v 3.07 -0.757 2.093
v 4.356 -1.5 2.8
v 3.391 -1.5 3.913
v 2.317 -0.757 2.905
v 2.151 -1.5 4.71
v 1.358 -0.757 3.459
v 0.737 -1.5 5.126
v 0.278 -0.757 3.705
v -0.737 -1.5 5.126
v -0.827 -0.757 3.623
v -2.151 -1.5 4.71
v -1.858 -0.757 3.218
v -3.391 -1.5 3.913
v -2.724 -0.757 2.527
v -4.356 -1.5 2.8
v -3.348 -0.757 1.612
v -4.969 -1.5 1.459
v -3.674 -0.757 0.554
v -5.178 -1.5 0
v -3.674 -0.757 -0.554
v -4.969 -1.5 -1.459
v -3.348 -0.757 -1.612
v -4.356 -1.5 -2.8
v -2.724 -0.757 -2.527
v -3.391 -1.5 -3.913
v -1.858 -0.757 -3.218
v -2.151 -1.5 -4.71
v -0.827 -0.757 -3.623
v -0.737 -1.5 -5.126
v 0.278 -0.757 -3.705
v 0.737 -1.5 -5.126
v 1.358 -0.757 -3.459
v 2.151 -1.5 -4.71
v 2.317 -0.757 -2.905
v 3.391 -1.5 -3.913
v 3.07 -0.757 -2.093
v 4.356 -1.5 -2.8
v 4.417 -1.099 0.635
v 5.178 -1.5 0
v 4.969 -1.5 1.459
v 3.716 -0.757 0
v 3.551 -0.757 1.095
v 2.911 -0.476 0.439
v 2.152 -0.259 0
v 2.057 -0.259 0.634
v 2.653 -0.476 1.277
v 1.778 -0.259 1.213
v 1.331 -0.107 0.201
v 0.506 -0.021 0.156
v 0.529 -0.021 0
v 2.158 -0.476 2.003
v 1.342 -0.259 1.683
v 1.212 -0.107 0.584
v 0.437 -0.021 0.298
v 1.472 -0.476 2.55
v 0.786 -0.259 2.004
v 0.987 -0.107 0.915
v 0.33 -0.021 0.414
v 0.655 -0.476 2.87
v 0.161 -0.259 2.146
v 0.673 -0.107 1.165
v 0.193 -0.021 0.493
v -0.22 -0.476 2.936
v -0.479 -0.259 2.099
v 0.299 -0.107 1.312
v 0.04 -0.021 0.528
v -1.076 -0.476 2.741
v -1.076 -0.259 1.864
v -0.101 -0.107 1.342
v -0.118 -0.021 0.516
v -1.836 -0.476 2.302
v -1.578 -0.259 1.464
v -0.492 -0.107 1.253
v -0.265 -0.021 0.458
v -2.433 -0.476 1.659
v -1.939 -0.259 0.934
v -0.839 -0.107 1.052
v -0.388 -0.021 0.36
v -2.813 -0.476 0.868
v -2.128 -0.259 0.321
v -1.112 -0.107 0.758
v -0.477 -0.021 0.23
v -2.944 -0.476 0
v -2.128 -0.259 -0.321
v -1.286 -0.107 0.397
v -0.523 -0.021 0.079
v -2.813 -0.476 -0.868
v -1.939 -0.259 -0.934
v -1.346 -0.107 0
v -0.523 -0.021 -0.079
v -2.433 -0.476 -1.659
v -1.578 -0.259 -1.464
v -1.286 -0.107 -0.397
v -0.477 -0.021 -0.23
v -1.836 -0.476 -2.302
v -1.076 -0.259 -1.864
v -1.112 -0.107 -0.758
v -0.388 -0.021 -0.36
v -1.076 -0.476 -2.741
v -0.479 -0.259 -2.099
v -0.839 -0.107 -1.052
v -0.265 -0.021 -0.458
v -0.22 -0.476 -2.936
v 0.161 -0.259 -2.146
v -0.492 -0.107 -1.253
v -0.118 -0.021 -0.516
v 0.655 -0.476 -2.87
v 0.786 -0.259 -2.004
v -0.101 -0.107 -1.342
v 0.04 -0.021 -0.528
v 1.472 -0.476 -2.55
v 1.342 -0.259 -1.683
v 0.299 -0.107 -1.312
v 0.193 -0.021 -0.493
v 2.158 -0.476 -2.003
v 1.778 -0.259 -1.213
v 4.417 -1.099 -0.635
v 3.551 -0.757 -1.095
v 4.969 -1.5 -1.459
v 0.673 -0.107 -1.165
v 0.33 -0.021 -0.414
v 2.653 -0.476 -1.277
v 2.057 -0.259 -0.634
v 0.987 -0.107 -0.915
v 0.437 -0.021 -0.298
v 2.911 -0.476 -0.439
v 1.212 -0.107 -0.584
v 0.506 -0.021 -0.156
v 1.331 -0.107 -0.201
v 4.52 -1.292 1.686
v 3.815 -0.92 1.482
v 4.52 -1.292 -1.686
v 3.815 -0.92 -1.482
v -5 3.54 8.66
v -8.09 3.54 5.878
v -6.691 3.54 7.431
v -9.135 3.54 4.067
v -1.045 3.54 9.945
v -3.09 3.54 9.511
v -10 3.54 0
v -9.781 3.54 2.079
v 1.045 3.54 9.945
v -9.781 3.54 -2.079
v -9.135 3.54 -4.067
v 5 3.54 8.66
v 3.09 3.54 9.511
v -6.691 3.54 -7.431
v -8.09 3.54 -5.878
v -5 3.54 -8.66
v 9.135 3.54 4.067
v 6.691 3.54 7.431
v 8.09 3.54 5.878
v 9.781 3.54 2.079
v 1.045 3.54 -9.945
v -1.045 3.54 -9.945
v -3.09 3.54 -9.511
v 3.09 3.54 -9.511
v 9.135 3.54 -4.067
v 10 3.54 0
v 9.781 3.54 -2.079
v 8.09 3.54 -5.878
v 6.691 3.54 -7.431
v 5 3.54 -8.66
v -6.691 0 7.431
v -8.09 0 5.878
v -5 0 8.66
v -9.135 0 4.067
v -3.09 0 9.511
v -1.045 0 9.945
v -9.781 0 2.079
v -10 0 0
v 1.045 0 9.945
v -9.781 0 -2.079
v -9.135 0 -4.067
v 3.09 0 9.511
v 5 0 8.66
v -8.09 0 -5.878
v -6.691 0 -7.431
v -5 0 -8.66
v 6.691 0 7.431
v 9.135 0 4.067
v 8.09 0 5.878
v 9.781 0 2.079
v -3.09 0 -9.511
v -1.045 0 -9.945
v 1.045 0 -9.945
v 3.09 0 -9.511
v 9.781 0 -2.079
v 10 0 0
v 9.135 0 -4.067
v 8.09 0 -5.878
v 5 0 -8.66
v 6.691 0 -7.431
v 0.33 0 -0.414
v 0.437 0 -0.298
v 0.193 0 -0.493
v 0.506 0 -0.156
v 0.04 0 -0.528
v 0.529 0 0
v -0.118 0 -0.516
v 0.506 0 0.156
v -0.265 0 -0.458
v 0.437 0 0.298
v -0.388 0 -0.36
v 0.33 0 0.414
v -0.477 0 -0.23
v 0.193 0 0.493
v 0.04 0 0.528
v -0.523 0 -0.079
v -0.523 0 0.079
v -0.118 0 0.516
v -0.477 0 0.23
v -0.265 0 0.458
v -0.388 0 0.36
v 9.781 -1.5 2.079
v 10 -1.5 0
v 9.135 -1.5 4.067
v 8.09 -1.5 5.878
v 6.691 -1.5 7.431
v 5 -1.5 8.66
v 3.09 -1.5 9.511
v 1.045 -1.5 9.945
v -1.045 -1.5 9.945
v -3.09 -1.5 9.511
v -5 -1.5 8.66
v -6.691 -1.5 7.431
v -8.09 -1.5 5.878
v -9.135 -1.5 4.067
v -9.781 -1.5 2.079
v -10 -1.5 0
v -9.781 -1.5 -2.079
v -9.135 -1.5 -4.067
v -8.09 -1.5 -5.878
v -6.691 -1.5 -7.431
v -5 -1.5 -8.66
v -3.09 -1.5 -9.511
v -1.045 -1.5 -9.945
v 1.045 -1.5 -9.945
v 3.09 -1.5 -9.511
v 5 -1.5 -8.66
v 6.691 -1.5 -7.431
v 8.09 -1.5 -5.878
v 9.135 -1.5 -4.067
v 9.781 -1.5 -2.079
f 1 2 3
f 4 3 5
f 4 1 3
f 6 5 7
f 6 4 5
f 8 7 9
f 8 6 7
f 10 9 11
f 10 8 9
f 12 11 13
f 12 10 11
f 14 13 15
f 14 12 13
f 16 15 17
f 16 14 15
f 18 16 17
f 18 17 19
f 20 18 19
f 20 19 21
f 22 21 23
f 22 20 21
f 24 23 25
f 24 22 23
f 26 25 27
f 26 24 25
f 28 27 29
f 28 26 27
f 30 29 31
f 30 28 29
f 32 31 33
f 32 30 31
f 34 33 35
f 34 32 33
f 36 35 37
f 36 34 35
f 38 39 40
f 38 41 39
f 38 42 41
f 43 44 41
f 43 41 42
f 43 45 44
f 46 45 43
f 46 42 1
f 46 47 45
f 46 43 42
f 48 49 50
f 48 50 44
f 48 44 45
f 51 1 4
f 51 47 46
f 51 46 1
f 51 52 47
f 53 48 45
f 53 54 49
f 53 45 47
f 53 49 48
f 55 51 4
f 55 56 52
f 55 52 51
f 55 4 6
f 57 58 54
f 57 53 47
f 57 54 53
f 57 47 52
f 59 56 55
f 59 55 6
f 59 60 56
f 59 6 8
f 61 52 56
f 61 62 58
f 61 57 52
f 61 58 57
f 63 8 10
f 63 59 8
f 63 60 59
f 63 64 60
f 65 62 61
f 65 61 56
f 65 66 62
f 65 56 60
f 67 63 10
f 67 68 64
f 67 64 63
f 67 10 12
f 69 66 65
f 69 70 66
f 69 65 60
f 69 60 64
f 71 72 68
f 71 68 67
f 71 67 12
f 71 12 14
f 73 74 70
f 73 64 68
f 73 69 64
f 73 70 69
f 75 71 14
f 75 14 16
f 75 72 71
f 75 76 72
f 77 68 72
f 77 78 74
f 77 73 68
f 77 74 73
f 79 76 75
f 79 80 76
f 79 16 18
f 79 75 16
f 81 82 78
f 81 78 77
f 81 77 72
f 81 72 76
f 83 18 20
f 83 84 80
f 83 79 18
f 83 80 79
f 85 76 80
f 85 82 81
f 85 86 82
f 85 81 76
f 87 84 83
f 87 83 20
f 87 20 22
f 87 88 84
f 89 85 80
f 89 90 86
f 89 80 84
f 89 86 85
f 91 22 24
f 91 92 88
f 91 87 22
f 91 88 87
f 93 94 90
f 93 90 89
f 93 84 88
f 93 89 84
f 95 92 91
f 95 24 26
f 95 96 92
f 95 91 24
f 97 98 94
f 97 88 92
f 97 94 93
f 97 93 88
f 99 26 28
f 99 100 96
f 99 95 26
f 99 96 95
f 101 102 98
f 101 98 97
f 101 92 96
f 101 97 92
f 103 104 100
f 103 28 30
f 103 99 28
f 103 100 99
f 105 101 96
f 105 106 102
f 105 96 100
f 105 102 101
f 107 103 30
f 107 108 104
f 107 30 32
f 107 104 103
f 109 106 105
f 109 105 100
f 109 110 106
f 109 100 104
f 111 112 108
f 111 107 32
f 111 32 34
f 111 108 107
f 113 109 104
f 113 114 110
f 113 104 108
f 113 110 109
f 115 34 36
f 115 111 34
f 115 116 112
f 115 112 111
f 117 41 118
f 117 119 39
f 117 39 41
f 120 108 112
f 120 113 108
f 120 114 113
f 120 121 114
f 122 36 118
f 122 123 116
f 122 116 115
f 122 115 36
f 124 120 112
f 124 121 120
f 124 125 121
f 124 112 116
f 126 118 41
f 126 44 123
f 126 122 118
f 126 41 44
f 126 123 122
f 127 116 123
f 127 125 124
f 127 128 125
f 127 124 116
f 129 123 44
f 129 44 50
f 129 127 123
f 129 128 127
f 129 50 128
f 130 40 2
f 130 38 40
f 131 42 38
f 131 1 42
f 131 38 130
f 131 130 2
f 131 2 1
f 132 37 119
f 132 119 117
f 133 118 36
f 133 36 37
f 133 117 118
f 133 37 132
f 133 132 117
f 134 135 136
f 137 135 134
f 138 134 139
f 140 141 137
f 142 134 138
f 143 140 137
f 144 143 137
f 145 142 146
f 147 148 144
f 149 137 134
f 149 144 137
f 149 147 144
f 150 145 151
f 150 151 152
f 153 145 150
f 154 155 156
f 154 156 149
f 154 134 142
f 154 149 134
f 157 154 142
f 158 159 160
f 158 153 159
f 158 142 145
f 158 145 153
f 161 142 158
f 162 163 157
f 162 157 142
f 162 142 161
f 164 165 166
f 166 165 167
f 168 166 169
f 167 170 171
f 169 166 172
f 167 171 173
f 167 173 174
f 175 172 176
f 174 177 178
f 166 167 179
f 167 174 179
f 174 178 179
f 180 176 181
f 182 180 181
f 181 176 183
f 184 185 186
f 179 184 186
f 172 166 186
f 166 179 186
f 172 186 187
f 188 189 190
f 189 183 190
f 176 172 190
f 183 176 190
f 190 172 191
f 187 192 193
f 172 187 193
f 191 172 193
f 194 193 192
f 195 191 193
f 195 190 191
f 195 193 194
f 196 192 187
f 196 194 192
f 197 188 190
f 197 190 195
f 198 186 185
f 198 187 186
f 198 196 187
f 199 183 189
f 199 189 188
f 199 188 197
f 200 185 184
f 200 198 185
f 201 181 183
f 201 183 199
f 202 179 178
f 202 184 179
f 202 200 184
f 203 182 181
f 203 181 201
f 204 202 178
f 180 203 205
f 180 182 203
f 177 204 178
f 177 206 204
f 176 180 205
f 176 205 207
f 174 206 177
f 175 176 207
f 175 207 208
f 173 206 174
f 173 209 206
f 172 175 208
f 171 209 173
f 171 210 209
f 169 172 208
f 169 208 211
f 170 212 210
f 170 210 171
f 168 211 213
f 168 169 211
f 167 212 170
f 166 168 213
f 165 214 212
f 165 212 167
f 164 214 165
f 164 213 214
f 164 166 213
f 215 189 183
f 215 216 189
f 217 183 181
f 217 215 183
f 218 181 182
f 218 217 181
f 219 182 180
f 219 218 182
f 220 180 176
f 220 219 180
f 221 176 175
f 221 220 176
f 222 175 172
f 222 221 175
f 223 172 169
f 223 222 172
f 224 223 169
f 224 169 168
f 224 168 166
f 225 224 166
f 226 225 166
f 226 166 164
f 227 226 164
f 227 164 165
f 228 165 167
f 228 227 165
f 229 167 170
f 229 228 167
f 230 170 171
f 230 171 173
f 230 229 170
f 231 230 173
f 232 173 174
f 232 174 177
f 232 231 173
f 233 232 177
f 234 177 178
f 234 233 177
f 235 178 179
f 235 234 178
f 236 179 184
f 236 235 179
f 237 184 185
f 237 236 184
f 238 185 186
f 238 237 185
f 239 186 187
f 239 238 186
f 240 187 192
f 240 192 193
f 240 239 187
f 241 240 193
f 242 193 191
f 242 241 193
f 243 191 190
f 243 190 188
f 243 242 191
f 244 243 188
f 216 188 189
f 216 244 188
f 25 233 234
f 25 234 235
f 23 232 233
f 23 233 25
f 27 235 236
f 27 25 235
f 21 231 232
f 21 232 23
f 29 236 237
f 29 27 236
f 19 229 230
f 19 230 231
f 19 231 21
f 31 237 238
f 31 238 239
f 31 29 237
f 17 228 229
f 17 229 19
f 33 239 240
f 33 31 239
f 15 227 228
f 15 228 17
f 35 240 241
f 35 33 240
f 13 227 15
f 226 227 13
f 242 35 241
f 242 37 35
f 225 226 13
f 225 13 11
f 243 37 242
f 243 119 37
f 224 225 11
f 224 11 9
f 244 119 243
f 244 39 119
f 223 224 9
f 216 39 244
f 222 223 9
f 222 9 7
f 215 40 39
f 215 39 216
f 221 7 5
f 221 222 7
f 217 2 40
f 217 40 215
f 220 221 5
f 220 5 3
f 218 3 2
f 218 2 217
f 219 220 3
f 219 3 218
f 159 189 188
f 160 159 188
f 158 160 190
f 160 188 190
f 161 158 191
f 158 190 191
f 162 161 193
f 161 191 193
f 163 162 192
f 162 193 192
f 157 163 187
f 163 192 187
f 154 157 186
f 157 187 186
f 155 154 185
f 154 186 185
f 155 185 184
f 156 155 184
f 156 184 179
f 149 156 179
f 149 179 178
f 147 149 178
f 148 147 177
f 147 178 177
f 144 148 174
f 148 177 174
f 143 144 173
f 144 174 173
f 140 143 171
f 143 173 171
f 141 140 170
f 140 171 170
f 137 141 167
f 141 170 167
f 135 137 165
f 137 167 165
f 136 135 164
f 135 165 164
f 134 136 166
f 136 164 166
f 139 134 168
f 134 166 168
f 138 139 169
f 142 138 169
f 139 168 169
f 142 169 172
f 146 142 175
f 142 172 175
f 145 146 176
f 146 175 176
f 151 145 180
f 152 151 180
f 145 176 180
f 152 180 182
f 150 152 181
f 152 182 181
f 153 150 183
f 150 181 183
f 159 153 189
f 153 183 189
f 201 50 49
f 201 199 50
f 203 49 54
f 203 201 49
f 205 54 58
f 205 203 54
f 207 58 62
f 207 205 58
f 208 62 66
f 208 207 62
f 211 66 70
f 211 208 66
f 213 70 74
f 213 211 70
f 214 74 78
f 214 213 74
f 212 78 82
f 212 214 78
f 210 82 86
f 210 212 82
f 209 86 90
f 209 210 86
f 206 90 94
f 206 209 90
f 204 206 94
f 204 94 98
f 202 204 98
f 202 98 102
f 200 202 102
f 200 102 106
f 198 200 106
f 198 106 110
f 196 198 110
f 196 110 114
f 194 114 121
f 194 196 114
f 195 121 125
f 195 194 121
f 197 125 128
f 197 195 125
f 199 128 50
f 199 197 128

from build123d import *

# Parameters (mm, degrees)
SKETCH1_R           = 10
BOSS_EXTRUDE1_DEPTH = 3.54


with BuildPart() as part:
    # Sketch1 → Boss-Extrude1 (new body)
    with BuildSketch(Plane(origin=(0, 0, 0), x_dir=(1, 0, 0), z_dir=(0, 1, 0))):
        Circle(SKETCH1_R)
    extrude(amount=BOSS_EXTRUDE1_DEPTH)


with BuildPart() as body_2:
    # Sketch2 → Revolve17 (revolve)
    with BuildSketch(Plane.XY):
        with BuildLine():
            ThreePointArc((5.178300859, -1.5), (2.94423774, -0.476404004), (0.529378062, -0.021168333))
            Line((0.529378062, -0.021168333), (0.529378062, 0))
            Line((0.529378062, 0), (10, 0))
            Line((10, 0), (10, -1.5))
            Line((10, -1.5), (5.178300859, -1.5))
        make_face()
    revolve(axis=Axis((0, 3.314129783, 0), (0, -1, 0)))


solid = Compound([part.part, body_2.part])
